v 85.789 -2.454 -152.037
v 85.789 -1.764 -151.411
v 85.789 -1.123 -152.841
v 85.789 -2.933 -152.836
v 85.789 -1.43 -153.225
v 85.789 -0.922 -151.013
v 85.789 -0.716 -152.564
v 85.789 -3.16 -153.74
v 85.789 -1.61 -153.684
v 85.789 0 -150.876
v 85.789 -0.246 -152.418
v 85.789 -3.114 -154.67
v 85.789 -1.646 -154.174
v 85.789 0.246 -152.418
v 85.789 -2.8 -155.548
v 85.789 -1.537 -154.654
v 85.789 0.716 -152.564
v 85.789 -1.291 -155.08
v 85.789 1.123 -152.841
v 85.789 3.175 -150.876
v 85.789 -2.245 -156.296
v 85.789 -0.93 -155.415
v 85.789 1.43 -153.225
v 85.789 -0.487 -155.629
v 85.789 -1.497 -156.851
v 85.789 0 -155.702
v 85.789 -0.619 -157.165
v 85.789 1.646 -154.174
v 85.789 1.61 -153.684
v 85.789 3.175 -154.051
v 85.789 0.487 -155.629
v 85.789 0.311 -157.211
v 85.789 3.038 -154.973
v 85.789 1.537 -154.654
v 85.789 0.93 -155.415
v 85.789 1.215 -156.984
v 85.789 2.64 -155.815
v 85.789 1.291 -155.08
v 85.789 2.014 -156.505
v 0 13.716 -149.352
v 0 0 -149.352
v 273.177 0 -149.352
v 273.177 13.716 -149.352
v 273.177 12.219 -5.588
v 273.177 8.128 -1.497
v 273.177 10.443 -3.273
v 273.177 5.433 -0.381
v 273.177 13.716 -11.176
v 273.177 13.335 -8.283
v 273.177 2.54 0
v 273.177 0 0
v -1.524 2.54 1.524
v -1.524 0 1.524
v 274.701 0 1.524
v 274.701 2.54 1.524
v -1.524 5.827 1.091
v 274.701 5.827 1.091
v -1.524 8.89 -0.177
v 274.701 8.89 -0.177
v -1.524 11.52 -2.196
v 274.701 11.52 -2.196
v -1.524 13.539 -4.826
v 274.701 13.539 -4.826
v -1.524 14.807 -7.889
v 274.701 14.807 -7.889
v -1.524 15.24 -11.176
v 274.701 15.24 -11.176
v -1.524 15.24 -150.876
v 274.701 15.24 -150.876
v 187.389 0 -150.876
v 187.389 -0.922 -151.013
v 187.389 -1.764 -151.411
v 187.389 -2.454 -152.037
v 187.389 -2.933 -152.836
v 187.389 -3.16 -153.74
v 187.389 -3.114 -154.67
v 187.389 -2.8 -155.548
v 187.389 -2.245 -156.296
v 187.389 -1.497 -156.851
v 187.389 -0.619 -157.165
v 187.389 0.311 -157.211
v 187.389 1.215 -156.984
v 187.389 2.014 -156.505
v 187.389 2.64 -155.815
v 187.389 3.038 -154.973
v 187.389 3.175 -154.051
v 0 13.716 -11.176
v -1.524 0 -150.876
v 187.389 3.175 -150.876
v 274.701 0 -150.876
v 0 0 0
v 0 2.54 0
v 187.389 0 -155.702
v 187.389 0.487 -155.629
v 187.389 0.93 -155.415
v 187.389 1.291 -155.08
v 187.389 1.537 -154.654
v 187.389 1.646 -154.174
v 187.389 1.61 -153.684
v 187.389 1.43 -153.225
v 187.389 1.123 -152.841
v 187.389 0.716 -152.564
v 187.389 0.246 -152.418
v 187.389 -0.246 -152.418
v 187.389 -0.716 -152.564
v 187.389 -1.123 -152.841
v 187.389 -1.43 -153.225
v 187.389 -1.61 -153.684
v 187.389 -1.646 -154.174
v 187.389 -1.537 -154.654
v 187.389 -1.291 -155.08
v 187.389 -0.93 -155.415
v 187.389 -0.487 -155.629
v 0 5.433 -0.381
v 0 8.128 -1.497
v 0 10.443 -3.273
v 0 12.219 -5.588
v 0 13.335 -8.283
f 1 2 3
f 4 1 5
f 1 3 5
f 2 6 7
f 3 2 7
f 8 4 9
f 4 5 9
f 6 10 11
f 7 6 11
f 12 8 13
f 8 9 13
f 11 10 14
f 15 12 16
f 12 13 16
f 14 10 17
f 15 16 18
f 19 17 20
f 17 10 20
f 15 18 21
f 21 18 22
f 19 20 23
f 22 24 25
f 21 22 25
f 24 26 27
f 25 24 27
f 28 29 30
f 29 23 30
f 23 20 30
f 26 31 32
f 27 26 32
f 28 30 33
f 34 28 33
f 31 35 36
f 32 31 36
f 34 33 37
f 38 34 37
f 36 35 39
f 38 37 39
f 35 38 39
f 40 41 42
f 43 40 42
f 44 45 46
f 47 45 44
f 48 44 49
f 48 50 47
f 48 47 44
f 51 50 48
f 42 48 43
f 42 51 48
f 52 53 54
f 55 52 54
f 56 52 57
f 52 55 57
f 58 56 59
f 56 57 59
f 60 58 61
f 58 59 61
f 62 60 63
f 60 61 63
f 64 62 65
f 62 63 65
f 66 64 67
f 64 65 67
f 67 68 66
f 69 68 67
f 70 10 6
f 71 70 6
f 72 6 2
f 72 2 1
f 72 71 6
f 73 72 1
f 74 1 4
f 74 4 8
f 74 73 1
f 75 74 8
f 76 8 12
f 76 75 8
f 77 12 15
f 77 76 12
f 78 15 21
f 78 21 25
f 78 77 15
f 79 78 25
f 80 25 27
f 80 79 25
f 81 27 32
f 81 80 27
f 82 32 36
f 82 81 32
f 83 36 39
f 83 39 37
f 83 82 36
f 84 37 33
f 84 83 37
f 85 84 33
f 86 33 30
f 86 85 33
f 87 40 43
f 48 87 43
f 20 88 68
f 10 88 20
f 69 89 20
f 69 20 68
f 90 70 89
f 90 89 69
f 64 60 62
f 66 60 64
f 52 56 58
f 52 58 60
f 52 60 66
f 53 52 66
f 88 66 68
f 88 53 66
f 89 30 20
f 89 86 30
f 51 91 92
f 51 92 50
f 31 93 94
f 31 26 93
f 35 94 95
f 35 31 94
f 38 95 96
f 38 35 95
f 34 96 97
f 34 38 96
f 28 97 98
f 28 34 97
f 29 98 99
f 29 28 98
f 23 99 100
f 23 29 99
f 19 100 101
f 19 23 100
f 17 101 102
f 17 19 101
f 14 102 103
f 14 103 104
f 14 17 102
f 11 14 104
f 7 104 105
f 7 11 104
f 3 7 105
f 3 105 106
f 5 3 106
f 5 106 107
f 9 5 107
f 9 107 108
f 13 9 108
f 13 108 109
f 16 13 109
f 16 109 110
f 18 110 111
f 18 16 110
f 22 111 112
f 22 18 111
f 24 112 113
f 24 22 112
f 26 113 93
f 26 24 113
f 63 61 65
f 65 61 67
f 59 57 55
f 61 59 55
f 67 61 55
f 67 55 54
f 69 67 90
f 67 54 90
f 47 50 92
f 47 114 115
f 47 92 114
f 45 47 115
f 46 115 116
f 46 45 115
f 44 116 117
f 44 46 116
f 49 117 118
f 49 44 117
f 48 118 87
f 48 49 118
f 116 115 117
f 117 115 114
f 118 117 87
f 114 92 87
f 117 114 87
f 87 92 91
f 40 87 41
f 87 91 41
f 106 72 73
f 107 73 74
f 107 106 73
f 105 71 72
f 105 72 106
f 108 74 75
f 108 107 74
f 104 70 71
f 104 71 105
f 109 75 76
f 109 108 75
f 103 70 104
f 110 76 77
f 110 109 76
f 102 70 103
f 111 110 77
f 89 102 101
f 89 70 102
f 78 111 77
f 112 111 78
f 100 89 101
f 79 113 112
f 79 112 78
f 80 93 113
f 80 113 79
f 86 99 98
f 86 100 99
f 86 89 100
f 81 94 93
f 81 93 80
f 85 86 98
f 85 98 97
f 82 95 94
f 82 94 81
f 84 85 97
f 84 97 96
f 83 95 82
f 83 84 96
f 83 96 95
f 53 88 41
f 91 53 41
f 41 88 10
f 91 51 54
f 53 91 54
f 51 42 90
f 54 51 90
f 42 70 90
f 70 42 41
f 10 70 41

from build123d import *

# Parameters (mm, degrees)
SKETCH1_W           = 276.225
SKETCH1_H           = 152.4
SKETCH1_W_2         = 273.177
SKETCH1_H_2         = 149.352
BULK_EXTRUDE_DEPTH  = 15.24
FILLET1_R           = 12.7
SHELL_T             = -1.524
SKETCH2_R           = 1.651
BOSS_EXTRUDE3_DEPTH = 50.8


with BuildPart() as part:
    # Sketch1 → Bulk-Extrude (new body)
    with BuildSketch(Plane(origin=(0, 0, 0), x_dir=(1, 0, 0), z_dir=(0, 1, 0))):
        with Locations((136.5885, 74.676)):
            Rectangle(SKETCH1_W, SKETCH1_H)
        with Locations((136.5885, 74.676)):
            Rectangle(SKETCH1_W_2, SKETCH1_H_2, mode=Mode.SUBTRACT)
        with Locations((136.5885, 74.676)):
            Rectangle(SKETCH1_W_2, SKETCH1_H_2)
    extrude(amount=BULK_EXTRUDE_DEPTH)

    # Fillet1
    fillet1_edges = [part.edges().sort_by_distance(p)[0] for p in [
        (136.5885, 15.24, 1.524),
    ]]
    fillet(fillet1_edges, radius=FILLET1_R)

    # Shell
    shell_openings = [part.faces().sort_by_distance(p)[0] for p in [
        (136.5885, 0, -74.676),
    ]]
    offset(amount=SHELL_T, openings=shell_openings, kind=Kind.INTERSECTION)

    # Sketch2 → Boss-Extrude3 (add, symmetric)
    with BuildSketch(Plane(origin=(136.5885, 0, 0), x_dir=(0, 0, -1), z_dir=(1, 0, 0))):
        with BuildLine():
            Line((150.876, 3.175), (150.876, 0))
            ThreePointArc((150.876, 0), (156.29606403, -2.24506403), (154.051, 3.175))
            Line((154.051, 3.175), (150.876, 3.175))
        make_face()
        with Locations((154.051, 0)):
            Circle(SKETCH2_R, mode=Mode.SUBTRACT)
    extrude(amount=BOSS_EXTRUDE3_DEPTH, both=True)


solid = part.part
